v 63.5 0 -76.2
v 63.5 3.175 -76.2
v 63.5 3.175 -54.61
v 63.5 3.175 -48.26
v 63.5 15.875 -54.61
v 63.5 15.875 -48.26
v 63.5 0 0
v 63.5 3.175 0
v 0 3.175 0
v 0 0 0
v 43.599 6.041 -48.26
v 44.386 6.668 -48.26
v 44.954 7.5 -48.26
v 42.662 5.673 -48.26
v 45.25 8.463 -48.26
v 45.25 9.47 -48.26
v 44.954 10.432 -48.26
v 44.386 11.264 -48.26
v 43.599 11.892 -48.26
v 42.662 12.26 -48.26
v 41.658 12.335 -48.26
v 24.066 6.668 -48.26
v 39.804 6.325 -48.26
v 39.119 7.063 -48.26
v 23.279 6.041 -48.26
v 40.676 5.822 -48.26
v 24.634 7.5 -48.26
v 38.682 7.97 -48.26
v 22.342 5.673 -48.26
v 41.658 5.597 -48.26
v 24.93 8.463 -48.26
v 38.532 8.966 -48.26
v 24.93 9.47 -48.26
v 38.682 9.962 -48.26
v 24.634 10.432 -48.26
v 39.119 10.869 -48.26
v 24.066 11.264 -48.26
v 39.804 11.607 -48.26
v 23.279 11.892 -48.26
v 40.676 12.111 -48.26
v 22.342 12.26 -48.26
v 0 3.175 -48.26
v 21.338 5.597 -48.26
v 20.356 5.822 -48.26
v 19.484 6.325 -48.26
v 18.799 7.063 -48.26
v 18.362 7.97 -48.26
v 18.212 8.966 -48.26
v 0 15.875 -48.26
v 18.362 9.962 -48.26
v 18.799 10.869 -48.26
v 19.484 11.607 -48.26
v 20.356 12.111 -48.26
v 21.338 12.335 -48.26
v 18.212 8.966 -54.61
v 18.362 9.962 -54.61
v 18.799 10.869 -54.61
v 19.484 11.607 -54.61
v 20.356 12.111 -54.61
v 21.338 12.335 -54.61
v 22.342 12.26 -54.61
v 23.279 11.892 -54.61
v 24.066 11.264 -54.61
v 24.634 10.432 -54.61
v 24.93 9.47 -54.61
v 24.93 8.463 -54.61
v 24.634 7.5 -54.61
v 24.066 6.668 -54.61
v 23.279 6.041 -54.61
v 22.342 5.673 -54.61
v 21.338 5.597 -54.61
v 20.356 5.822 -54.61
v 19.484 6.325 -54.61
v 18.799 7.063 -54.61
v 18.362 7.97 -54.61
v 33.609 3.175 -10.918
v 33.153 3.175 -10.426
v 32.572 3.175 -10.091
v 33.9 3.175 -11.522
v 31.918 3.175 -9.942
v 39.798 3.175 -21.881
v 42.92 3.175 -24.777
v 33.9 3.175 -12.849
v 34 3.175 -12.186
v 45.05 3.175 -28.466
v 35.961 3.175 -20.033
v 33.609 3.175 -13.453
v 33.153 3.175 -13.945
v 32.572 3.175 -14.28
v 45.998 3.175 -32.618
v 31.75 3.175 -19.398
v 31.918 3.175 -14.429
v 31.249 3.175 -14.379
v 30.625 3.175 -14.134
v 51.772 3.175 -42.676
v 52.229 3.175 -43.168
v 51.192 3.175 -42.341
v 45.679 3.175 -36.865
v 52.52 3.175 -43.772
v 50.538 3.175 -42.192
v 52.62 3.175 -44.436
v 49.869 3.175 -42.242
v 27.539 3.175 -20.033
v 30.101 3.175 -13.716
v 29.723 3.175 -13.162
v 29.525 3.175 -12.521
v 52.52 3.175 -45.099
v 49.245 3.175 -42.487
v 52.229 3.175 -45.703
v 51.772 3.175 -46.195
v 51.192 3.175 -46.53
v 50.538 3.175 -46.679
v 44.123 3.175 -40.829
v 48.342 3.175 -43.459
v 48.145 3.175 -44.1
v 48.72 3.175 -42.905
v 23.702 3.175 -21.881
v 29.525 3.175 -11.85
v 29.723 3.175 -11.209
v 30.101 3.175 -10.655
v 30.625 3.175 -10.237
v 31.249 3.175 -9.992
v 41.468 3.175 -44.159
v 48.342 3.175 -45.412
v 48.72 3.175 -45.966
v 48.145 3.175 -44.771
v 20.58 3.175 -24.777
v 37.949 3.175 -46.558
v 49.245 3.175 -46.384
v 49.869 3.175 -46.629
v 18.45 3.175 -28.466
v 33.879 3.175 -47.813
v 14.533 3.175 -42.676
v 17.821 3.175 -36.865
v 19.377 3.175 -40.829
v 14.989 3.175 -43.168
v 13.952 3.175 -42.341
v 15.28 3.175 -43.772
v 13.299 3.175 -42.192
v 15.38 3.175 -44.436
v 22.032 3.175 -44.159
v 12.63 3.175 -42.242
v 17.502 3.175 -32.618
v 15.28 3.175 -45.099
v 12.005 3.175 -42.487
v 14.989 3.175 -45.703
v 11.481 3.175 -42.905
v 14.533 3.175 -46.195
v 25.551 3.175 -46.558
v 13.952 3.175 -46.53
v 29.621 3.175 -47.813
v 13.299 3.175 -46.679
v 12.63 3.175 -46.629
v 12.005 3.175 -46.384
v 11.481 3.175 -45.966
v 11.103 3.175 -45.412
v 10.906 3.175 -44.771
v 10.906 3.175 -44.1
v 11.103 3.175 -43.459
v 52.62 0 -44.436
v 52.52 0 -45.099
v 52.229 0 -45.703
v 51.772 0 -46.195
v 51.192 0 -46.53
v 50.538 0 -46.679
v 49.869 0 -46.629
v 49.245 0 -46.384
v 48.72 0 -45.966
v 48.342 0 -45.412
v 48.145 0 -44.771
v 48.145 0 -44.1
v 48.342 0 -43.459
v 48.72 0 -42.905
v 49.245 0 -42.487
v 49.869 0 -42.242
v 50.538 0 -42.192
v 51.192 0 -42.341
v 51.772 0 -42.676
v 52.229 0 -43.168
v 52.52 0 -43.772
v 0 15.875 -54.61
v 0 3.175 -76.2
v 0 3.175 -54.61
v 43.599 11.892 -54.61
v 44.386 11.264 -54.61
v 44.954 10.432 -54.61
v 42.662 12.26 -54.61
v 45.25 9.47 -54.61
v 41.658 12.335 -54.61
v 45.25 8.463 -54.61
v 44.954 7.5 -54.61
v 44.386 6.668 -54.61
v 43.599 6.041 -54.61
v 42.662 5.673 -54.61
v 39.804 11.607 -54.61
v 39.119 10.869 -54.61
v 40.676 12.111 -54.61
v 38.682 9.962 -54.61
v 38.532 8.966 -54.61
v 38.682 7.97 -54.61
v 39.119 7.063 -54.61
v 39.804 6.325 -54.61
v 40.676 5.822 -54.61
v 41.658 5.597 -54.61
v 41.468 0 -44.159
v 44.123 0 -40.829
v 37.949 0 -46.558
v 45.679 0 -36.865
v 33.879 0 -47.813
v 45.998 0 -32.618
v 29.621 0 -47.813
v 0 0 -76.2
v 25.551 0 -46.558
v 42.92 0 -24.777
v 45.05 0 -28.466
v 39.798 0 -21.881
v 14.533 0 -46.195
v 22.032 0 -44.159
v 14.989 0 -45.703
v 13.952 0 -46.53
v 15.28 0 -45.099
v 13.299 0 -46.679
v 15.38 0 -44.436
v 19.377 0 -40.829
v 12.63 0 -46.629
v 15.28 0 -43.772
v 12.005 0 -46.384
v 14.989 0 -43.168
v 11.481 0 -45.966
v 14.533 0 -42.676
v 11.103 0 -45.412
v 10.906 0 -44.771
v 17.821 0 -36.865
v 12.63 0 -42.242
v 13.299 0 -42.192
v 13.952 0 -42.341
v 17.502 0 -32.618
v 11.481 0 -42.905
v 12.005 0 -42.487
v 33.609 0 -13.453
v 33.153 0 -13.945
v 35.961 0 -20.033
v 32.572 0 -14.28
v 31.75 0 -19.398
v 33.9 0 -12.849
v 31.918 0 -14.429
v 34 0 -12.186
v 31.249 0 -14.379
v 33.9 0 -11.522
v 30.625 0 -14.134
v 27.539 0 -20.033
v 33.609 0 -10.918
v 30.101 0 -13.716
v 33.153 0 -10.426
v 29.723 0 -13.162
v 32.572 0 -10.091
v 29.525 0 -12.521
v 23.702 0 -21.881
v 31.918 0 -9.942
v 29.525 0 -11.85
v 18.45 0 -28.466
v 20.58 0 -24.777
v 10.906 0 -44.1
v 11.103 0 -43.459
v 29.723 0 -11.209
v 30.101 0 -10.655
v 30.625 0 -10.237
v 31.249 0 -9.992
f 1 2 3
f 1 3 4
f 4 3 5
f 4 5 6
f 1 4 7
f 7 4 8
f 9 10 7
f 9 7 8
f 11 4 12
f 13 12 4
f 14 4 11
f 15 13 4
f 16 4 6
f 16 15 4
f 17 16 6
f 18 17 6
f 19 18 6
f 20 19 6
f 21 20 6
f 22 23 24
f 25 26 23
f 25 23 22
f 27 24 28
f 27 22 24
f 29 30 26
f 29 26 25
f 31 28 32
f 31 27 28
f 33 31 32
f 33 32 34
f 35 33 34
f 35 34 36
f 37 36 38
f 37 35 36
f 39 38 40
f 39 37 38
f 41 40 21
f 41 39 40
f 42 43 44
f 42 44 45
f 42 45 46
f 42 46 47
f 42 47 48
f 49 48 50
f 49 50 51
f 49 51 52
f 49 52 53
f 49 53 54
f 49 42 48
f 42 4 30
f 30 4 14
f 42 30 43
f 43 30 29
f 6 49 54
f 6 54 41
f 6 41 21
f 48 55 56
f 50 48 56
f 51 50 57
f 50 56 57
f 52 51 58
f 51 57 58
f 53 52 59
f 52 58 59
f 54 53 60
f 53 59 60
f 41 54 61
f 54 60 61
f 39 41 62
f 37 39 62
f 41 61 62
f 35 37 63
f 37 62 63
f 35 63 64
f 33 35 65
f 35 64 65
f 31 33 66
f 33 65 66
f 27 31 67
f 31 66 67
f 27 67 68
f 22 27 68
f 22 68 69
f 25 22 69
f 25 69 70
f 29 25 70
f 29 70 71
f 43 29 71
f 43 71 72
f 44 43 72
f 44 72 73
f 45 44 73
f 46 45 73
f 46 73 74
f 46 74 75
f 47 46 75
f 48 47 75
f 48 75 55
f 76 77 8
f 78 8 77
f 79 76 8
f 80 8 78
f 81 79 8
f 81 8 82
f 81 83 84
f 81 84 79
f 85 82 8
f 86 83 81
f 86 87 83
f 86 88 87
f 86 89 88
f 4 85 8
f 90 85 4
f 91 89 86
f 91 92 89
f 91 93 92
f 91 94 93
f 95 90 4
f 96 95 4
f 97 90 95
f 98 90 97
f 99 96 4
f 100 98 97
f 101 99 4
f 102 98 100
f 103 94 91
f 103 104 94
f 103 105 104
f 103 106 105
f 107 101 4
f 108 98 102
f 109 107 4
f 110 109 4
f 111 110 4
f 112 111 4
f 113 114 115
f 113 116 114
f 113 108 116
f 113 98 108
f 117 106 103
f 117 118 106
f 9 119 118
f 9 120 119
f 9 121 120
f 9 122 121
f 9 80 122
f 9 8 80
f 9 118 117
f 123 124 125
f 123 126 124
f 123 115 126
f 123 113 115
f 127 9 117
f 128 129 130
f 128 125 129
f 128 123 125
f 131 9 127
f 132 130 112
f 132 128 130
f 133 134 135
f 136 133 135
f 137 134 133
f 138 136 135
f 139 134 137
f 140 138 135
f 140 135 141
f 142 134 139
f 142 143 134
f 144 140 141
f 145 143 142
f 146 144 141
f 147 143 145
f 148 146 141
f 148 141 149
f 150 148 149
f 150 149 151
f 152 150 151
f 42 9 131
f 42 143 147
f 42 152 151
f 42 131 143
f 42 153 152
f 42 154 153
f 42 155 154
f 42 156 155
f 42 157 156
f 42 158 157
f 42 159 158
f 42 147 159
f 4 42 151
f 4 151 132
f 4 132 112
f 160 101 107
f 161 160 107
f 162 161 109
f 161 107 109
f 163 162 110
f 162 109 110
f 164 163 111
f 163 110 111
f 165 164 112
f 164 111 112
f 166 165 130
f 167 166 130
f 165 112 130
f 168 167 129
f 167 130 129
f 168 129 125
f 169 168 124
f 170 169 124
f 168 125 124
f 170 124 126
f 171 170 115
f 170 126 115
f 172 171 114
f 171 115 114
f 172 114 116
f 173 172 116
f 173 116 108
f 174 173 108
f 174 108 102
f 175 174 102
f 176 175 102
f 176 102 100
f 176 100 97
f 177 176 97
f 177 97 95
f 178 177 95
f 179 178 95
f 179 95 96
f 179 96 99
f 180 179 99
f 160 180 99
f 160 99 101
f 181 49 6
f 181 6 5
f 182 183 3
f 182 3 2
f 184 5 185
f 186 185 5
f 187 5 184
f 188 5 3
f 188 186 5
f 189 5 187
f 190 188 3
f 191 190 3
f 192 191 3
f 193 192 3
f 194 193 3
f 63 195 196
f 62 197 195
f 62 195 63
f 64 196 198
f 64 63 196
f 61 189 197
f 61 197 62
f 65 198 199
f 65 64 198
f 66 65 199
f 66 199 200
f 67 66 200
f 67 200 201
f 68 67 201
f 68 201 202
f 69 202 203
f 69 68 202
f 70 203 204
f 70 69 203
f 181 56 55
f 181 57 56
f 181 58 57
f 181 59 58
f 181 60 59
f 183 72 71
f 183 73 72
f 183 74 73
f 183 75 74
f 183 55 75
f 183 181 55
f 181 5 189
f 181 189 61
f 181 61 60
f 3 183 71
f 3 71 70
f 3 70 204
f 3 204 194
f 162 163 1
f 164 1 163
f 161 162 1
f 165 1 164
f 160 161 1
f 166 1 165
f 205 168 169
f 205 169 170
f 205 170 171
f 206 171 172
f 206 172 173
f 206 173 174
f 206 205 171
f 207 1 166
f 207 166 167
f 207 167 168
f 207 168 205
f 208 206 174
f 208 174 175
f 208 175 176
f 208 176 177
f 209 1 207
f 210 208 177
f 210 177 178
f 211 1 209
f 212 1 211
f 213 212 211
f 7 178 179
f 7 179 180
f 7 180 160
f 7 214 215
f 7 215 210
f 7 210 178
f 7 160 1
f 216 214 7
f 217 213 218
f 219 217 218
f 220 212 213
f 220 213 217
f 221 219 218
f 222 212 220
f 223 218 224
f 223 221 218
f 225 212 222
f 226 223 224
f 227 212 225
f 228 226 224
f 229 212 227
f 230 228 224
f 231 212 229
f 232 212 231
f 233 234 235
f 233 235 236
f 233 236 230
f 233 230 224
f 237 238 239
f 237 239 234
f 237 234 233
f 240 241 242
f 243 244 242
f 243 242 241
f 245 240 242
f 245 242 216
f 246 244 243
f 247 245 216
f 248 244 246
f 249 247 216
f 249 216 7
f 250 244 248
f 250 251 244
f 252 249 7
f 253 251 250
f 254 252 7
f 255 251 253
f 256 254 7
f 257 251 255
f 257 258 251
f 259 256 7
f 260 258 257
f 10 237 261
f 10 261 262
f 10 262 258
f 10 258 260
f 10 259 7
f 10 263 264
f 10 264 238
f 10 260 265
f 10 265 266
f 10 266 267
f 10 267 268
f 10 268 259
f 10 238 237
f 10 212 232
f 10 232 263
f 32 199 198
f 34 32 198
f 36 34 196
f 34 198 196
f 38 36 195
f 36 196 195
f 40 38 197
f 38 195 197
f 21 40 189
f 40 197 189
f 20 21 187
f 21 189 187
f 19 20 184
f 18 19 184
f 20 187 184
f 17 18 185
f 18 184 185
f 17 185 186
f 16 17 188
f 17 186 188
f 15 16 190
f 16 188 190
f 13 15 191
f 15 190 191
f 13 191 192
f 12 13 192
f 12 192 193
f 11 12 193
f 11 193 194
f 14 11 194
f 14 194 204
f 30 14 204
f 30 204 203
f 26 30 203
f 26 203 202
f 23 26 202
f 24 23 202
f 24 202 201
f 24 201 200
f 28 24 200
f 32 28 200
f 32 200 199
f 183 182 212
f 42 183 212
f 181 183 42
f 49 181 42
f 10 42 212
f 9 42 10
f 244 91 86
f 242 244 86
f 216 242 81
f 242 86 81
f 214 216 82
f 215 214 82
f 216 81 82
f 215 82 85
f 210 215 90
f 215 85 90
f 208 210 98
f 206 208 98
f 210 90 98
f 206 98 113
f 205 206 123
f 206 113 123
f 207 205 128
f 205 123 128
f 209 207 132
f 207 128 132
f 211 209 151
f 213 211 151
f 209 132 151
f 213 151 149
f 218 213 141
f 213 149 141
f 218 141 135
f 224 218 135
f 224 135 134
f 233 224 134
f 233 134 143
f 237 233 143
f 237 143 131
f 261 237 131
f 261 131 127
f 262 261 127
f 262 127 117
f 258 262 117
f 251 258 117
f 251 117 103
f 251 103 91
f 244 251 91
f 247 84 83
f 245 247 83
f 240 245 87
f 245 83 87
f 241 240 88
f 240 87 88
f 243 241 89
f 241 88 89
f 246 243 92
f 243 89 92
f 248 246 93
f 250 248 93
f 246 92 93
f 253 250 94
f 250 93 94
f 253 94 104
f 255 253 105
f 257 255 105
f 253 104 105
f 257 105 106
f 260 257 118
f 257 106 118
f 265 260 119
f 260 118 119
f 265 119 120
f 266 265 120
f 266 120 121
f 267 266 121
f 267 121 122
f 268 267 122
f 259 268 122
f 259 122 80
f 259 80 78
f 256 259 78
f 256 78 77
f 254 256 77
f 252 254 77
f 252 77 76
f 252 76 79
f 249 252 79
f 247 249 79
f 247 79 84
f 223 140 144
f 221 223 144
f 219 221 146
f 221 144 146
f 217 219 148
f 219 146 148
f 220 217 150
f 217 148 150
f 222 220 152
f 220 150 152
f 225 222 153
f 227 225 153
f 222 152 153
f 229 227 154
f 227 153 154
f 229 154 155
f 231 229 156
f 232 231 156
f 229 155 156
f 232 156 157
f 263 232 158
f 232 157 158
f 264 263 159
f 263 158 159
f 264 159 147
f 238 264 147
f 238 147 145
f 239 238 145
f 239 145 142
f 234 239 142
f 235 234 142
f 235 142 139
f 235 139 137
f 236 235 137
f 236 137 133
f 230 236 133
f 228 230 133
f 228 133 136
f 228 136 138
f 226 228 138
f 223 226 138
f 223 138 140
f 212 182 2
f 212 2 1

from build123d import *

# Parameters (mm, degrees)
BOSS_EXTRUDE1_DEPTH     = 63.5
SKETCH2_R               = 14.2875
CUT_EXTRUDE1_DEPTH      = 100.9999
M4_CLEARANCE_HOLE1_D    = 4.5
F_1_4_CLEARANCE_HOLE1_D = 6.7564


with BuildPart() as part:
    # Sketch1 → Boss-Extrude1 (new body)
    with BuildSketch(Plane(origin=(0, 0, 0), x_dir=(0, 0, -1), z_dir=(1, 0, 0))):
        Polygon((0, 0), (0, 3.175), (48.26, 3.175), (48.26, 15.875), (54.61, 15.875), (54.61, 3.175), (76.2, 3.175), (76.2, 0), align=None)
    extrude(amount=BOSS_EXTRUDE1_DEPTH)

    # Sketch2 → Cut-Extrude1 (cut, through all)
    with BuildSketch(Plane(origin=(0, 3.175, 0), x_dir=(1, 0, 0), z_dir=(0, 1, 0))):
        with Locations(Location((31.75, 33.685553713, 0), (0, 0, 270))):
            Circle(SKETCH2_R)
    extrude(amount=-CUT_EXTRUDE1_DEPTH, mode=Mode.SUBTRACT)

    # M4 Clearance Hole1 (through all)
    with Locations(Plane(origin=(0, 0, 0), x_dir=(-1, 0, 0), z_dir=(0, -1, 0))):
        with Locations((-31.75, 12.185553713), (-50.369546181, 44.435553713), (-13.130453819, 44.435553713)):
            Hole(M4_CLEARANCE_HOLE1_D / 2)

    # 1/4 Clearance Hole1 (through all)
    with Locations(Plane.XY.offset(-48.26)):
        with Locations((41.91, 8.9662), (21.59, 8.9662)):
            Hole(F_1_4_CLEARANCE_HOLE1_D / 2)


solid = part.part
